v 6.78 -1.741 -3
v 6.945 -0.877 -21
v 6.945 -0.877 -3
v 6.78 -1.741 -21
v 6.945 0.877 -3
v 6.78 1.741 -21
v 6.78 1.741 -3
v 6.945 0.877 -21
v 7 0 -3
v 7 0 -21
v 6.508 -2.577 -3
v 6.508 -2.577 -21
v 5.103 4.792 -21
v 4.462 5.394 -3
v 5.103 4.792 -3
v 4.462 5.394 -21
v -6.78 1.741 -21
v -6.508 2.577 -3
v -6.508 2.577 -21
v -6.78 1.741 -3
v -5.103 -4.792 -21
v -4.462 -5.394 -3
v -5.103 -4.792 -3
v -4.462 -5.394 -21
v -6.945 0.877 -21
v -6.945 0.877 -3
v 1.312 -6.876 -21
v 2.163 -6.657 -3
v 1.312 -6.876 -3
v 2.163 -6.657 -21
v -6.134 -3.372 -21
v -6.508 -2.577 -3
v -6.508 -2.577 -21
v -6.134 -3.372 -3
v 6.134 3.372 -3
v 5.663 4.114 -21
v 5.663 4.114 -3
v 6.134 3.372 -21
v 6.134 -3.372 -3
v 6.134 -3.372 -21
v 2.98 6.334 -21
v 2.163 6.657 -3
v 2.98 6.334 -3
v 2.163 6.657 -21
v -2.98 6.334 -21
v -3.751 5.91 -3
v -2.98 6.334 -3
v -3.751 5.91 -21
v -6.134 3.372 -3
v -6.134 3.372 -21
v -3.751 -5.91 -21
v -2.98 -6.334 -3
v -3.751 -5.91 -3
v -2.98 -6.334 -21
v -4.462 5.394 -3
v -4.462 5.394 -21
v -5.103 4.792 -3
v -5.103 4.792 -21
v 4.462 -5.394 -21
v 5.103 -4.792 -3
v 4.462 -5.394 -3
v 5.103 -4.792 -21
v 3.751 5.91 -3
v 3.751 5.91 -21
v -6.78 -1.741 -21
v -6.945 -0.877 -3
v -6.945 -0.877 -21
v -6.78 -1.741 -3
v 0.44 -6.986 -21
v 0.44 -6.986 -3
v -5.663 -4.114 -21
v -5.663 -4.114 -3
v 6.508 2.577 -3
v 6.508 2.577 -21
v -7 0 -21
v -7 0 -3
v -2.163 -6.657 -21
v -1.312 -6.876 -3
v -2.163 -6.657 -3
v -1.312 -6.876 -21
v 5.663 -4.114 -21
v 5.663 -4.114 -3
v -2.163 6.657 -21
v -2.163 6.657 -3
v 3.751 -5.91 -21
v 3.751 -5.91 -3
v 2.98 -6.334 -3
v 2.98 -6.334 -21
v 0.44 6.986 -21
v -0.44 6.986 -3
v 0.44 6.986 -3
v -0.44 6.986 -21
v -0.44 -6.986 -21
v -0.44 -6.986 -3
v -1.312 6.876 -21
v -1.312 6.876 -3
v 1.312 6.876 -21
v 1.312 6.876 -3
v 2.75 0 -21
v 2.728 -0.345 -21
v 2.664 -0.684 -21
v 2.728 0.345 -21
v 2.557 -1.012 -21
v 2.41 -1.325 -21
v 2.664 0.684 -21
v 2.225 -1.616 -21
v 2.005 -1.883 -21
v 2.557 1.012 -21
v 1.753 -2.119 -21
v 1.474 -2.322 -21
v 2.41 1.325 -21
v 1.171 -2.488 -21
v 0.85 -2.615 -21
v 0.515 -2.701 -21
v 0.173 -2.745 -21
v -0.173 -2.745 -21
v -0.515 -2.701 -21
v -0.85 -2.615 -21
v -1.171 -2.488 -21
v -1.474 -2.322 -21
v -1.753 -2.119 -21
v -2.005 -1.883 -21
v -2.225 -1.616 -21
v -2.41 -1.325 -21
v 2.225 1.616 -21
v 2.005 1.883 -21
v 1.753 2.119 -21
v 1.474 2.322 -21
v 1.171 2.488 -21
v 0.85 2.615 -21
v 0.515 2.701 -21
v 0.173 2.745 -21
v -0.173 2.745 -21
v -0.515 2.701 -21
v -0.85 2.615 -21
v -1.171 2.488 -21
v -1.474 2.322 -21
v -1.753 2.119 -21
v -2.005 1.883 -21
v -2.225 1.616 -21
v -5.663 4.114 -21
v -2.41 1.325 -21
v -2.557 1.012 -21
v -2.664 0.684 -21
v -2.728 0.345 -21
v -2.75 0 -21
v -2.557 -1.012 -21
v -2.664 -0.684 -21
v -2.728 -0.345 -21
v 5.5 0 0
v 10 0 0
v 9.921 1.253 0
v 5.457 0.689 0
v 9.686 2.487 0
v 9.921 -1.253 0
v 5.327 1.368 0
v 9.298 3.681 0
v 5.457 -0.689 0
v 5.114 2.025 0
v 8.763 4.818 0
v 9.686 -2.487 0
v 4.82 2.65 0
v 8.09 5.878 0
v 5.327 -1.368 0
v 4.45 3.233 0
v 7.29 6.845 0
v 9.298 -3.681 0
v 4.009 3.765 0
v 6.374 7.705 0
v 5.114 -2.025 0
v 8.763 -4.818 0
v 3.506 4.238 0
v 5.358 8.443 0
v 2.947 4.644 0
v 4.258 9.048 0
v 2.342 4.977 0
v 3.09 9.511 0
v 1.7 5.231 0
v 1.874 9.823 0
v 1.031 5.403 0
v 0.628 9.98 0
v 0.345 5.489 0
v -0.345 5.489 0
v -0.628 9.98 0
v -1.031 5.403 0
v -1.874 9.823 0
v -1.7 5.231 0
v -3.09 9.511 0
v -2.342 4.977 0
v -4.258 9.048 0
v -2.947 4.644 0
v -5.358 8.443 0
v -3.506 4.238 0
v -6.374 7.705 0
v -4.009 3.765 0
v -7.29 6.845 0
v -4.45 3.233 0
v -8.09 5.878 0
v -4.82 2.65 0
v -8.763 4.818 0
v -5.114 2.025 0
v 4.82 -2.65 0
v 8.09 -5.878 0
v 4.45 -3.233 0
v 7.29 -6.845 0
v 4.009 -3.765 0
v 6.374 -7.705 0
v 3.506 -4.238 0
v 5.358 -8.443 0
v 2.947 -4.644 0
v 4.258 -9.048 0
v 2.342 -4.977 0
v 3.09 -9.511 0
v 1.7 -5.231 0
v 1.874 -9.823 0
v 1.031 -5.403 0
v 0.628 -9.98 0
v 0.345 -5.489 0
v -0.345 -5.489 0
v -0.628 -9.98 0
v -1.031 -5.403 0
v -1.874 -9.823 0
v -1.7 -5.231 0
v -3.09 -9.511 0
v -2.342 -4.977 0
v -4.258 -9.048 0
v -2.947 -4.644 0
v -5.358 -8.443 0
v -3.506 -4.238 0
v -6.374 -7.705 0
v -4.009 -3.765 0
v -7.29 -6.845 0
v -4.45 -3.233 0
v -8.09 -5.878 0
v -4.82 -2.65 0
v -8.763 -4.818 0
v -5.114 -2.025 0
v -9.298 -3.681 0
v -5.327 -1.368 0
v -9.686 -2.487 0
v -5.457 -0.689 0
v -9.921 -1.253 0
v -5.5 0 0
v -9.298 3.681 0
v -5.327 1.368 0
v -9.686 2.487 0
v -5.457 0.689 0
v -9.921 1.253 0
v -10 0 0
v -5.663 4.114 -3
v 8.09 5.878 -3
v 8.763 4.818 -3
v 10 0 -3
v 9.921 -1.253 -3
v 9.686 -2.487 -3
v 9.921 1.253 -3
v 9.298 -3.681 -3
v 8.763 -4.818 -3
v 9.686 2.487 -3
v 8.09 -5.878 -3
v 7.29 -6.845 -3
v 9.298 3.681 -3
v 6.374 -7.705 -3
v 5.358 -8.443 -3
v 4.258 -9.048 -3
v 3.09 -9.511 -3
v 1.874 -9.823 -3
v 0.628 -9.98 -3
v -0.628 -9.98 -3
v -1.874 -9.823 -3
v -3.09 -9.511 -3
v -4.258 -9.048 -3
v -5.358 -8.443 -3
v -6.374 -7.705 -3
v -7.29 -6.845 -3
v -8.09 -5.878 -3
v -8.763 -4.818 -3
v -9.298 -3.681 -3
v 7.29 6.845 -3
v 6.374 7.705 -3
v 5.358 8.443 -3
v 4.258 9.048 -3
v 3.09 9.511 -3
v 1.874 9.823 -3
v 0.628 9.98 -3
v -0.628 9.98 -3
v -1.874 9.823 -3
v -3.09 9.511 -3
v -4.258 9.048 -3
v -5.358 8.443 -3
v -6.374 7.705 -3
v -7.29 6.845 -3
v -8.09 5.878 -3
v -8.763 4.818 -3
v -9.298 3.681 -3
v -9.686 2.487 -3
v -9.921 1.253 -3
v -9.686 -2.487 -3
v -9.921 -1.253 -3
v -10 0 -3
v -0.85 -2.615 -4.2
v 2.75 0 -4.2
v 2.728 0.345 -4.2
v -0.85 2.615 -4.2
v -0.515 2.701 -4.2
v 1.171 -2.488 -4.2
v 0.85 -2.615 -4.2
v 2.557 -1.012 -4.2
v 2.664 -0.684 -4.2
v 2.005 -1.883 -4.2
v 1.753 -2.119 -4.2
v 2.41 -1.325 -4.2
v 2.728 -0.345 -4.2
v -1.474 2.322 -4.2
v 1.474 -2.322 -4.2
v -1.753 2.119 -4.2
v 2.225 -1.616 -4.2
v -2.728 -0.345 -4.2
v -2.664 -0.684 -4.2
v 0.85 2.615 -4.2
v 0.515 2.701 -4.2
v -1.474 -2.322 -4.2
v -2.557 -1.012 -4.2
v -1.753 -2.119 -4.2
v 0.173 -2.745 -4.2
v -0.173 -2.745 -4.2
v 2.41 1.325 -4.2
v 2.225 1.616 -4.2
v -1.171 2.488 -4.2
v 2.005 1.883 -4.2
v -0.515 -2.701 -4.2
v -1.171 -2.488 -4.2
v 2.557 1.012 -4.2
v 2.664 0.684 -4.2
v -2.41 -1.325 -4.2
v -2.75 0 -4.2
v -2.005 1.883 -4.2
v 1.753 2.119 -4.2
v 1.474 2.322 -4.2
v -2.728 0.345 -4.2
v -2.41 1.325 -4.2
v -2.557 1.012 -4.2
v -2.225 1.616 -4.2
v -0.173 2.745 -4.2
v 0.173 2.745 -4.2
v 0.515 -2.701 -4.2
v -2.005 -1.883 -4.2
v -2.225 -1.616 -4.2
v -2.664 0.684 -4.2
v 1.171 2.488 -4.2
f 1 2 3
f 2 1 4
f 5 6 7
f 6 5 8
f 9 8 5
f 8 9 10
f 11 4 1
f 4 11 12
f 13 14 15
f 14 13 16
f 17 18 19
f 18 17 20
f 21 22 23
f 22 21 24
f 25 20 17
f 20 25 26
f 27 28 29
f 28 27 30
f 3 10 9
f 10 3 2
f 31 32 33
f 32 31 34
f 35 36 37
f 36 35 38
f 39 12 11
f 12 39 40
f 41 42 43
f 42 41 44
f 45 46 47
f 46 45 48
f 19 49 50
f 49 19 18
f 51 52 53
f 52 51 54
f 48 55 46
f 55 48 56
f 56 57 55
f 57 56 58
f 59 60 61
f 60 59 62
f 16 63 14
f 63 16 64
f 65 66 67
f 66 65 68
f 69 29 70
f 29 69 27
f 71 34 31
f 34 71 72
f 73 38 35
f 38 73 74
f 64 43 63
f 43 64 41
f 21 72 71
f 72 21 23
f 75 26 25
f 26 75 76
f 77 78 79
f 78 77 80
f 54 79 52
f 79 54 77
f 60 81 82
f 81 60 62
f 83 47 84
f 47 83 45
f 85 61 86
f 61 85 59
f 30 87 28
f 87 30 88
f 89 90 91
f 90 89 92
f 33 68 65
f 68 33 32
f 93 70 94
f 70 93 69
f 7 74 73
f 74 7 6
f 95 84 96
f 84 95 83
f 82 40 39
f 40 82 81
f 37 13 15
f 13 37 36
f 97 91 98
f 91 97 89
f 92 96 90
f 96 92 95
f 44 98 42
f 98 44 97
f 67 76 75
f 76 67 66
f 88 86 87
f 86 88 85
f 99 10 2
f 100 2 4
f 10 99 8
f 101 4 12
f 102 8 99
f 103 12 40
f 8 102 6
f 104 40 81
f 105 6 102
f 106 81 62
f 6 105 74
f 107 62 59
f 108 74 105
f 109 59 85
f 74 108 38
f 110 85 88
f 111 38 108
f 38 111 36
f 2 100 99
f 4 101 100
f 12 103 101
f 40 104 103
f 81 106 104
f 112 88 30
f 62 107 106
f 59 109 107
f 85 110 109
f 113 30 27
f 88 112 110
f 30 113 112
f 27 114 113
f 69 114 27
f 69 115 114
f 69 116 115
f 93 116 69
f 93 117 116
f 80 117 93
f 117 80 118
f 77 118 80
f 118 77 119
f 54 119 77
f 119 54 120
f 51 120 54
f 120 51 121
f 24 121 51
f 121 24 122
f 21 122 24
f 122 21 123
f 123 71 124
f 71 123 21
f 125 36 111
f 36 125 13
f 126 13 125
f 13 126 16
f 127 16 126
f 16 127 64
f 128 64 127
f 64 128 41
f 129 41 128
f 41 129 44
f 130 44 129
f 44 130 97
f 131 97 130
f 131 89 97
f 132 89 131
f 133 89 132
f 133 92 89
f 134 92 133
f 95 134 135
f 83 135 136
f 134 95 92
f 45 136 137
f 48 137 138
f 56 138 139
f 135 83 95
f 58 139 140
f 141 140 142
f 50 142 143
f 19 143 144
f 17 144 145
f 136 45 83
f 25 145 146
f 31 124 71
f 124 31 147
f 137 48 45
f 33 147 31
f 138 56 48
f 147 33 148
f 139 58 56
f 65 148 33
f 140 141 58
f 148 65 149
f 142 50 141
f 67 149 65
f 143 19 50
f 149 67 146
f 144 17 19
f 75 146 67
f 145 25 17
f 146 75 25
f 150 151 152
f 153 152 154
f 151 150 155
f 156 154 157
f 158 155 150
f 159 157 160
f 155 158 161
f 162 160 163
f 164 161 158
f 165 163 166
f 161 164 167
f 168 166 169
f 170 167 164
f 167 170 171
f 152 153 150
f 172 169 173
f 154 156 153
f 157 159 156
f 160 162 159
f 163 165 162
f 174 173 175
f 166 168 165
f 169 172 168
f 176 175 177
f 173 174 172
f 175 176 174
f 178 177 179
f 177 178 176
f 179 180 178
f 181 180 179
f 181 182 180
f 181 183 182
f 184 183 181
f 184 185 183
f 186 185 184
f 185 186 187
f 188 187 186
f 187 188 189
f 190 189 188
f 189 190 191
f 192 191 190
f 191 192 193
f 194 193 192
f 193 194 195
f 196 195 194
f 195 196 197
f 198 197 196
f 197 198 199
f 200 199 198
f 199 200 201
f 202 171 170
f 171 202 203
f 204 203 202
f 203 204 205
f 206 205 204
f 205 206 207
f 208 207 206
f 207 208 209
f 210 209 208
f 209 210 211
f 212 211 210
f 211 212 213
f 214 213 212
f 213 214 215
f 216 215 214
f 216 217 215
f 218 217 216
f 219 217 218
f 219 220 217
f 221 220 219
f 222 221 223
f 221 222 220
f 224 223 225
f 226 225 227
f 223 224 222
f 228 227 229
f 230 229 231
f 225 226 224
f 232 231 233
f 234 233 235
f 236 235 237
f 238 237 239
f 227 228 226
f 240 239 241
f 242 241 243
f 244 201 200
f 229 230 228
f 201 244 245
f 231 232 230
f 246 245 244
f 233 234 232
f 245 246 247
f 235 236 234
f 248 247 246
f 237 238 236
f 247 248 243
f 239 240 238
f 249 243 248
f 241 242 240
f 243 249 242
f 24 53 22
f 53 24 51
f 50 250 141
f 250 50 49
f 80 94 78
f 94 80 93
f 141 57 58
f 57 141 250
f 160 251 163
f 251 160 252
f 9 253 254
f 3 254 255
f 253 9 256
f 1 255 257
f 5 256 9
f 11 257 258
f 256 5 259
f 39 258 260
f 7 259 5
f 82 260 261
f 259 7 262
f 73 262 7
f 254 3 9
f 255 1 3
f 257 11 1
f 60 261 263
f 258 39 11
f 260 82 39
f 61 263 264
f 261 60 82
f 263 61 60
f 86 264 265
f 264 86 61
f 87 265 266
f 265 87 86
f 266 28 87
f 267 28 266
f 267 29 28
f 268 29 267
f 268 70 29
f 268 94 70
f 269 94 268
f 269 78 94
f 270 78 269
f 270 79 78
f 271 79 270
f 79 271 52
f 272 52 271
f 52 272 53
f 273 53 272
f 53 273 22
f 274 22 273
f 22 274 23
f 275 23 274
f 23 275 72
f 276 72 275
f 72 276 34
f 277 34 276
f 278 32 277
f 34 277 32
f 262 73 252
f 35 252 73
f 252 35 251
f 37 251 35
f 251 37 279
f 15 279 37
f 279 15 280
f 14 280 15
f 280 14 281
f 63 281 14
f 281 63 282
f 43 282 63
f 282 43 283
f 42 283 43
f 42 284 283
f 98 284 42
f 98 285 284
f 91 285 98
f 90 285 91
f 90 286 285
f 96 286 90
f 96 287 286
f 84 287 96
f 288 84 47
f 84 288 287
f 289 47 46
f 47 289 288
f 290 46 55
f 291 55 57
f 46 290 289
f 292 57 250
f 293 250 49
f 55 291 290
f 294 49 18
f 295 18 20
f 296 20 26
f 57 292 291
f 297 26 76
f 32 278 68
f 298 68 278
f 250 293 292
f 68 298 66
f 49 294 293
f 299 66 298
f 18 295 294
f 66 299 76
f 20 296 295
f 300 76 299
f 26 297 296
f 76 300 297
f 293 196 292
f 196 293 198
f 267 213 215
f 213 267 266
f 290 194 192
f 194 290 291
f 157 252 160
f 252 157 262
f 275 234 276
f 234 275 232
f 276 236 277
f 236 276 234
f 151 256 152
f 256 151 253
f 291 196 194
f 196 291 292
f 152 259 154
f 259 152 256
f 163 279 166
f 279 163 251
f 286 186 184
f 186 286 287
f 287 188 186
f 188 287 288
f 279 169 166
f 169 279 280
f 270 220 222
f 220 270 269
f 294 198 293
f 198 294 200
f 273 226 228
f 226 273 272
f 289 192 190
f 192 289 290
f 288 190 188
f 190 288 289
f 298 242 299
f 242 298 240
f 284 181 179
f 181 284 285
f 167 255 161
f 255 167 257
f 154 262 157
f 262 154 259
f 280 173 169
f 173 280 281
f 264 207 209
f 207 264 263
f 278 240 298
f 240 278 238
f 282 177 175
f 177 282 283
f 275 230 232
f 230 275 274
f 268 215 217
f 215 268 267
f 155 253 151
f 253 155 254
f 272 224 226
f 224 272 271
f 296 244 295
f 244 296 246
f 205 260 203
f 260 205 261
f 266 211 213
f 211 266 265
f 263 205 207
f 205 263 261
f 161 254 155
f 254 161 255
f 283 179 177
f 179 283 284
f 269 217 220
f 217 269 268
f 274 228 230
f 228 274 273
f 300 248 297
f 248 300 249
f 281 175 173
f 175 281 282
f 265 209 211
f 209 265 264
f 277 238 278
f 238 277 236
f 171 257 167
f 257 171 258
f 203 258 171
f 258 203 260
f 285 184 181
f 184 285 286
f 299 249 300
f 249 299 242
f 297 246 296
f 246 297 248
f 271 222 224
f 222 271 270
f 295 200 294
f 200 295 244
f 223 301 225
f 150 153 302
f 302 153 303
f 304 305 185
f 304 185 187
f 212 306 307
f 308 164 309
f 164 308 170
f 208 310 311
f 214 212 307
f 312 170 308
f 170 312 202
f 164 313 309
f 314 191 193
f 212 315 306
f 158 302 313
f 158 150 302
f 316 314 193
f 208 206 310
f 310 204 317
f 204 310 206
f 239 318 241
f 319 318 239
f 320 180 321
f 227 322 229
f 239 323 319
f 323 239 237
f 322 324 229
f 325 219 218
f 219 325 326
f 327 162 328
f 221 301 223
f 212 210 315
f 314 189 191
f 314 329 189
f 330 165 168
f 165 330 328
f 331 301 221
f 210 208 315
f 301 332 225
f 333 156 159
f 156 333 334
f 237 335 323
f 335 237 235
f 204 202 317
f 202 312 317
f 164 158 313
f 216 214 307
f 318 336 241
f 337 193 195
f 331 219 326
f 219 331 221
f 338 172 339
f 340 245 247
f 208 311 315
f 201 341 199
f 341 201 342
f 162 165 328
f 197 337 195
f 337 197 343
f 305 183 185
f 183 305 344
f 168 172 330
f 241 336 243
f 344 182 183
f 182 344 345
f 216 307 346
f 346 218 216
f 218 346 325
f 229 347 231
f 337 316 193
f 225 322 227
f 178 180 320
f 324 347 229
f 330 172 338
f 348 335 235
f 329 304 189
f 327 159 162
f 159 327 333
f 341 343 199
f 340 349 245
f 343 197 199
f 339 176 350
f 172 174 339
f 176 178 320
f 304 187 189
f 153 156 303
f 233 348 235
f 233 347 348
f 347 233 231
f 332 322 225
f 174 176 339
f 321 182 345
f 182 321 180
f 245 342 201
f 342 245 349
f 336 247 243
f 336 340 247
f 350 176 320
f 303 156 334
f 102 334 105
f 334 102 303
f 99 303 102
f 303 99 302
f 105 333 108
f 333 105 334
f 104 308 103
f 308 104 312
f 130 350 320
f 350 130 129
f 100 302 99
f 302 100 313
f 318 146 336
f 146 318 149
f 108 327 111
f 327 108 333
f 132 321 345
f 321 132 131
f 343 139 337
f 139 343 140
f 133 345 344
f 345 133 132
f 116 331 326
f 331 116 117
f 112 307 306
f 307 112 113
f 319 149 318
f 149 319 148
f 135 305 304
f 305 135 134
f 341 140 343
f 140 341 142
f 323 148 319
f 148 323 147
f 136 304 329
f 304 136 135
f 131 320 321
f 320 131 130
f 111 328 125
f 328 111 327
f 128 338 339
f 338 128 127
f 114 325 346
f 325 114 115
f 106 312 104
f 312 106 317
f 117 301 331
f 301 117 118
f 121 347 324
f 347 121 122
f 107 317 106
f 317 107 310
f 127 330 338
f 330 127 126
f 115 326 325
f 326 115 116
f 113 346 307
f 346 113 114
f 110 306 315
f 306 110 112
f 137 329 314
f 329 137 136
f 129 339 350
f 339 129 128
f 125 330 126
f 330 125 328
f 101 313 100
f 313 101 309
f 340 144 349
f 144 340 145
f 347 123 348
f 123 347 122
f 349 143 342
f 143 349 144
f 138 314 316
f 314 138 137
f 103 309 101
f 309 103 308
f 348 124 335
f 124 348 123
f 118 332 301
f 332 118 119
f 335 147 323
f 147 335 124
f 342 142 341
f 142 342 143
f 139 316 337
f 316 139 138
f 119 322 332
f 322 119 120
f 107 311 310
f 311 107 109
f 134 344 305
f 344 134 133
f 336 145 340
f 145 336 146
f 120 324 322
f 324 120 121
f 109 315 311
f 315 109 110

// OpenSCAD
$fn = 50;


difference() {
	union() {
		translate(v = [0, 0, -21.0000000000]) {
			cylinder(h = 21, r = 7.0000000000);
		}
		translate(v = [0, 0, -3.0000000000]) {
			cylinder(h = 3, r = 10.0000000000);
		}
	}
	union() {
		translate(v = [0, 0, 0]) {
			rotate(a = [0, 0, 0]) {
				difference() {
					union() {
						#translate(v = [0, 0, -21.0000000000]) {
							cylinder(h = 21, r = 2.2500000000);
						}
						#translate(v = [0, 0, -4.2000000000]) {
							cylinder(h = 4.2000000000, r = 7.0000000000, r1 = 2.7500000000, r2 = 5.5000000000);
						}
						#translate(v = [0, 0, -21.0000000000]) {
							cylinder(h = 21, r = 2.7500000000);
						}
						#translate(v = [0, 0, -21.0000000000]) {
							cylinder(h = 21, r = 2.2500000000);
						}
					}
					union();
				}
			}
		}
	}
}
